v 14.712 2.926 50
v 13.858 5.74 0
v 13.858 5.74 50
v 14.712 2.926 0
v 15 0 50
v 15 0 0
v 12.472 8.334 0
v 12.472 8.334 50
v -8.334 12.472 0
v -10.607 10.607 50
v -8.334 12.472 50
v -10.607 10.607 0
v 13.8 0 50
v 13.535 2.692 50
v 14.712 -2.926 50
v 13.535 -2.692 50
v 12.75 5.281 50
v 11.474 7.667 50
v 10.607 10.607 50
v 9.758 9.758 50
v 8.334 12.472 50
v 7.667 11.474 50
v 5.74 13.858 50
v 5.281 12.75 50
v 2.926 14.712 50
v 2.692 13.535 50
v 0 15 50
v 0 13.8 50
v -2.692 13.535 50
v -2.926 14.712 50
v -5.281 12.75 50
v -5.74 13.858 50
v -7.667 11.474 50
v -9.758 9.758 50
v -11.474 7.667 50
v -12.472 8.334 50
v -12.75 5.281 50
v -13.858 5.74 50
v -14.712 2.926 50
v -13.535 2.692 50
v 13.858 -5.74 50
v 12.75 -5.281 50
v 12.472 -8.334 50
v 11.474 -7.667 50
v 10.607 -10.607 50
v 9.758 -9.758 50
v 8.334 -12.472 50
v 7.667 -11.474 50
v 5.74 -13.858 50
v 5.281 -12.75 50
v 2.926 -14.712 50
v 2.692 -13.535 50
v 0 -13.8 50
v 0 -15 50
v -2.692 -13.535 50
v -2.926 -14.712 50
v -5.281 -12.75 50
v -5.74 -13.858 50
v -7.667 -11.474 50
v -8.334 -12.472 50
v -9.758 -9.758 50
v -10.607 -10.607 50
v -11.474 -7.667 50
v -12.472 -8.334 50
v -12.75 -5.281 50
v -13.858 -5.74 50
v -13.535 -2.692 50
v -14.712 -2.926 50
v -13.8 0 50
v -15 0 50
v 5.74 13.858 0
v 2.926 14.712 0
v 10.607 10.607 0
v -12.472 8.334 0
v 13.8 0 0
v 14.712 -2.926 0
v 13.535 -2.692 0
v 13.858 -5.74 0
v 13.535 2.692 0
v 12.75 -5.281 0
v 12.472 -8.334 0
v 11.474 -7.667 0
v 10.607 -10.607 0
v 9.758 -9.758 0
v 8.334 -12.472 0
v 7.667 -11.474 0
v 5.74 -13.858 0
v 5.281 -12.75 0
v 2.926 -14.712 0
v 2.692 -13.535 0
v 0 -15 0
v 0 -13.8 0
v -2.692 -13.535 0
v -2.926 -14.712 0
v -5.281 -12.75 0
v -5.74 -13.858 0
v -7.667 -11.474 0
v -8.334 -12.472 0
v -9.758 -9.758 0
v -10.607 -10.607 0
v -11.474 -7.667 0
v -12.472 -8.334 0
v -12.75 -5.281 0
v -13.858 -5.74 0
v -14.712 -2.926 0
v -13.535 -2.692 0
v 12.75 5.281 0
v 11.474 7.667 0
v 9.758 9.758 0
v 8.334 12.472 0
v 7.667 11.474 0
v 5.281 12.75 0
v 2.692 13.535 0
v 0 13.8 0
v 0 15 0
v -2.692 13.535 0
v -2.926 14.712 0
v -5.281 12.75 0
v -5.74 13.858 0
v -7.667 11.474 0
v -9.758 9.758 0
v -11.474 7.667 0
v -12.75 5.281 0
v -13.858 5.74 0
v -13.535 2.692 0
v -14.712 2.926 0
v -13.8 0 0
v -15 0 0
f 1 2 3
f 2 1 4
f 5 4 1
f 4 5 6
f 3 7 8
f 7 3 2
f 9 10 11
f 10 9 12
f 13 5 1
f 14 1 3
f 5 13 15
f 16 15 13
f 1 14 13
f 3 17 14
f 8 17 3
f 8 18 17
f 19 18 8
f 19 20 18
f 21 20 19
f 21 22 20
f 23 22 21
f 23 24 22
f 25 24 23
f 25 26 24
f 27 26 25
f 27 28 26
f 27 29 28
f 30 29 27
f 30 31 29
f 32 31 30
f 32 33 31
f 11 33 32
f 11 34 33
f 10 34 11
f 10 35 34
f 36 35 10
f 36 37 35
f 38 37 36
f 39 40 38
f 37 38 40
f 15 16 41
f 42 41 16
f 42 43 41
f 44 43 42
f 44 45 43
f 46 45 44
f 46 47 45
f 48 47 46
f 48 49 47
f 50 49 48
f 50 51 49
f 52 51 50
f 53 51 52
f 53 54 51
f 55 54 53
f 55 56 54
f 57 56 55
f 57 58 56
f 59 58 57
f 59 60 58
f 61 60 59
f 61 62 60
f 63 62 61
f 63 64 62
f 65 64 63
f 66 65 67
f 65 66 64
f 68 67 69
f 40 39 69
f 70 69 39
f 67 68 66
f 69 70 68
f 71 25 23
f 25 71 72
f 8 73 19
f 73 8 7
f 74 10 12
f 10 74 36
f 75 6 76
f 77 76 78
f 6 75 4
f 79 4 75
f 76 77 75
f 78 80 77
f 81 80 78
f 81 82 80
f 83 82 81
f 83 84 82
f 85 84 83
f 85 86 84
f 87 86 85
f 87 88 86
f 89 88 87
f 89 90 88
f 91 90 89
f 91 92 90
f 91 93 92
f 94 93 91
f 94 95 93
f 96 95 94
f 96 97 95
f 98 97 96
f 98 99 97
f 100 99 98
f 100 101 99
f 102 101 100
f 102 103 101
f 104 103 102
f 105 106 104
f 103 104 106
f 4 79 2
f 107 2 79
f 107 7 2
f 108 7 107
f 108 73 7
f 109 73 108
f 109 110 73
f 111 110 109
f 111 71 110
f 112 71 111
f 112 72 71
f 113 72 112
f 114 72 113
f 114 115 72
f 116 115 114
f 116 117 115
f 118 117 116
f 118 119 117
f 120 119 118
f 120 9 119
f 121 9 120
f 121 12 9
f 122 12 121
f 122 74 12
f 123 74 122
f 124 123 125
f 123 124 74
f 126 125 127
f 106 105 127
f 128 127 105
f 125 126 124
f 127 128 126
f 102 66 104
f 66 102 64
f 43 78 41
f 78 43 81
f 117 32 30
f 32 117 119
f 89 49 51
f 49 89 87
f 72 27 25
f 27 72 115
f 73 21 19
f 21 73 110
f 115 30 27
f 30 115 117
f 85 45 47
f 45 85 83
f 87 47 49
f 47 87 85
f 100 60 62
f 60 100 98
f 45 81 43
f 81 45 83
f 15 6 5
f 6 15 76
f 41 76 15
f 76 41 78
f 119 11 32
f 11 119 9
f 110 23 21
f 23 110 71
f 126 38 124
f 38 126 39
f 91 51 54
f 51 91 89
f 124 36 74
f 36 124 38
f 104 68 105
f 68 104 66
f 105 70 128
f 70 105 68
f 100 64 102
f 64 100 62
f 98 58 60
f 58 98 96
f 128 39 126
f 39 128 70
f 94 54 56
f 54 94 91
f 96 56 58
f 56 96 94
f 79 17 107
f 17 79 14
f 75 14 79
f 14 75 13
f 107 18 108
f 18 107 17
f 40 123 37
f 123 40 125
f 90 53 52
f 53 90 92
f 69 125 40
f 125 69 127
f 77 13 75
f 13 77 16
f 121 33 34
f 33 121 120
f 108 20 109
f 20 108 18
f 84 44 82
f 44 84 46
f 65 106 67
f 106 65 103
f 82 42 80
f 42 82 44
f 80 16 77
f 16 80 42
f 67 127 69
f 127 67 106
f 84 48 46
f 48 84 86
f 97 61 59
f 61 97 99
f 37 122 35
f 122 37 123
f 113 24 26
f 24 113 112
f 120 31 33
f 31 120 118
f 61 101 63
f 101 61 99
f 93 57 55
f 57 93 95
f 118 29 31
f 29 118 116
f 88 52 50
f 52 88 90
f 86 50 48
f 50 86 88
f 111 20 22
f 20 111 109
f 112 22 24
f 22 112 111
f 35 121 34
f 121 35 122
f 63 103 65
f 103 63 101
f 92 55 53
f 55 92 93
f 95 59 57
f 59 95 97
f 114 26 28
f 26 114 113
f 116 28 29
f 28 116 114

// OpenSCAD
$fn = 32;

// ----------------------------------------------------------------------
// Thin tube: 1.2 mm wall
// ----------------------------------------------------------------------

// --- parameters (mm) ---
tube_od = 30;             // outer diameter
tube_h = 50;              // height, Z
wall = 1.2;               // wall thickness

difference() {
  cylinder(h = tube_h, d = tube_od);
  translate([0, 0, -1]) cylinder(h = tube_h + 2, d = tube_od - 2 * wall);
}
